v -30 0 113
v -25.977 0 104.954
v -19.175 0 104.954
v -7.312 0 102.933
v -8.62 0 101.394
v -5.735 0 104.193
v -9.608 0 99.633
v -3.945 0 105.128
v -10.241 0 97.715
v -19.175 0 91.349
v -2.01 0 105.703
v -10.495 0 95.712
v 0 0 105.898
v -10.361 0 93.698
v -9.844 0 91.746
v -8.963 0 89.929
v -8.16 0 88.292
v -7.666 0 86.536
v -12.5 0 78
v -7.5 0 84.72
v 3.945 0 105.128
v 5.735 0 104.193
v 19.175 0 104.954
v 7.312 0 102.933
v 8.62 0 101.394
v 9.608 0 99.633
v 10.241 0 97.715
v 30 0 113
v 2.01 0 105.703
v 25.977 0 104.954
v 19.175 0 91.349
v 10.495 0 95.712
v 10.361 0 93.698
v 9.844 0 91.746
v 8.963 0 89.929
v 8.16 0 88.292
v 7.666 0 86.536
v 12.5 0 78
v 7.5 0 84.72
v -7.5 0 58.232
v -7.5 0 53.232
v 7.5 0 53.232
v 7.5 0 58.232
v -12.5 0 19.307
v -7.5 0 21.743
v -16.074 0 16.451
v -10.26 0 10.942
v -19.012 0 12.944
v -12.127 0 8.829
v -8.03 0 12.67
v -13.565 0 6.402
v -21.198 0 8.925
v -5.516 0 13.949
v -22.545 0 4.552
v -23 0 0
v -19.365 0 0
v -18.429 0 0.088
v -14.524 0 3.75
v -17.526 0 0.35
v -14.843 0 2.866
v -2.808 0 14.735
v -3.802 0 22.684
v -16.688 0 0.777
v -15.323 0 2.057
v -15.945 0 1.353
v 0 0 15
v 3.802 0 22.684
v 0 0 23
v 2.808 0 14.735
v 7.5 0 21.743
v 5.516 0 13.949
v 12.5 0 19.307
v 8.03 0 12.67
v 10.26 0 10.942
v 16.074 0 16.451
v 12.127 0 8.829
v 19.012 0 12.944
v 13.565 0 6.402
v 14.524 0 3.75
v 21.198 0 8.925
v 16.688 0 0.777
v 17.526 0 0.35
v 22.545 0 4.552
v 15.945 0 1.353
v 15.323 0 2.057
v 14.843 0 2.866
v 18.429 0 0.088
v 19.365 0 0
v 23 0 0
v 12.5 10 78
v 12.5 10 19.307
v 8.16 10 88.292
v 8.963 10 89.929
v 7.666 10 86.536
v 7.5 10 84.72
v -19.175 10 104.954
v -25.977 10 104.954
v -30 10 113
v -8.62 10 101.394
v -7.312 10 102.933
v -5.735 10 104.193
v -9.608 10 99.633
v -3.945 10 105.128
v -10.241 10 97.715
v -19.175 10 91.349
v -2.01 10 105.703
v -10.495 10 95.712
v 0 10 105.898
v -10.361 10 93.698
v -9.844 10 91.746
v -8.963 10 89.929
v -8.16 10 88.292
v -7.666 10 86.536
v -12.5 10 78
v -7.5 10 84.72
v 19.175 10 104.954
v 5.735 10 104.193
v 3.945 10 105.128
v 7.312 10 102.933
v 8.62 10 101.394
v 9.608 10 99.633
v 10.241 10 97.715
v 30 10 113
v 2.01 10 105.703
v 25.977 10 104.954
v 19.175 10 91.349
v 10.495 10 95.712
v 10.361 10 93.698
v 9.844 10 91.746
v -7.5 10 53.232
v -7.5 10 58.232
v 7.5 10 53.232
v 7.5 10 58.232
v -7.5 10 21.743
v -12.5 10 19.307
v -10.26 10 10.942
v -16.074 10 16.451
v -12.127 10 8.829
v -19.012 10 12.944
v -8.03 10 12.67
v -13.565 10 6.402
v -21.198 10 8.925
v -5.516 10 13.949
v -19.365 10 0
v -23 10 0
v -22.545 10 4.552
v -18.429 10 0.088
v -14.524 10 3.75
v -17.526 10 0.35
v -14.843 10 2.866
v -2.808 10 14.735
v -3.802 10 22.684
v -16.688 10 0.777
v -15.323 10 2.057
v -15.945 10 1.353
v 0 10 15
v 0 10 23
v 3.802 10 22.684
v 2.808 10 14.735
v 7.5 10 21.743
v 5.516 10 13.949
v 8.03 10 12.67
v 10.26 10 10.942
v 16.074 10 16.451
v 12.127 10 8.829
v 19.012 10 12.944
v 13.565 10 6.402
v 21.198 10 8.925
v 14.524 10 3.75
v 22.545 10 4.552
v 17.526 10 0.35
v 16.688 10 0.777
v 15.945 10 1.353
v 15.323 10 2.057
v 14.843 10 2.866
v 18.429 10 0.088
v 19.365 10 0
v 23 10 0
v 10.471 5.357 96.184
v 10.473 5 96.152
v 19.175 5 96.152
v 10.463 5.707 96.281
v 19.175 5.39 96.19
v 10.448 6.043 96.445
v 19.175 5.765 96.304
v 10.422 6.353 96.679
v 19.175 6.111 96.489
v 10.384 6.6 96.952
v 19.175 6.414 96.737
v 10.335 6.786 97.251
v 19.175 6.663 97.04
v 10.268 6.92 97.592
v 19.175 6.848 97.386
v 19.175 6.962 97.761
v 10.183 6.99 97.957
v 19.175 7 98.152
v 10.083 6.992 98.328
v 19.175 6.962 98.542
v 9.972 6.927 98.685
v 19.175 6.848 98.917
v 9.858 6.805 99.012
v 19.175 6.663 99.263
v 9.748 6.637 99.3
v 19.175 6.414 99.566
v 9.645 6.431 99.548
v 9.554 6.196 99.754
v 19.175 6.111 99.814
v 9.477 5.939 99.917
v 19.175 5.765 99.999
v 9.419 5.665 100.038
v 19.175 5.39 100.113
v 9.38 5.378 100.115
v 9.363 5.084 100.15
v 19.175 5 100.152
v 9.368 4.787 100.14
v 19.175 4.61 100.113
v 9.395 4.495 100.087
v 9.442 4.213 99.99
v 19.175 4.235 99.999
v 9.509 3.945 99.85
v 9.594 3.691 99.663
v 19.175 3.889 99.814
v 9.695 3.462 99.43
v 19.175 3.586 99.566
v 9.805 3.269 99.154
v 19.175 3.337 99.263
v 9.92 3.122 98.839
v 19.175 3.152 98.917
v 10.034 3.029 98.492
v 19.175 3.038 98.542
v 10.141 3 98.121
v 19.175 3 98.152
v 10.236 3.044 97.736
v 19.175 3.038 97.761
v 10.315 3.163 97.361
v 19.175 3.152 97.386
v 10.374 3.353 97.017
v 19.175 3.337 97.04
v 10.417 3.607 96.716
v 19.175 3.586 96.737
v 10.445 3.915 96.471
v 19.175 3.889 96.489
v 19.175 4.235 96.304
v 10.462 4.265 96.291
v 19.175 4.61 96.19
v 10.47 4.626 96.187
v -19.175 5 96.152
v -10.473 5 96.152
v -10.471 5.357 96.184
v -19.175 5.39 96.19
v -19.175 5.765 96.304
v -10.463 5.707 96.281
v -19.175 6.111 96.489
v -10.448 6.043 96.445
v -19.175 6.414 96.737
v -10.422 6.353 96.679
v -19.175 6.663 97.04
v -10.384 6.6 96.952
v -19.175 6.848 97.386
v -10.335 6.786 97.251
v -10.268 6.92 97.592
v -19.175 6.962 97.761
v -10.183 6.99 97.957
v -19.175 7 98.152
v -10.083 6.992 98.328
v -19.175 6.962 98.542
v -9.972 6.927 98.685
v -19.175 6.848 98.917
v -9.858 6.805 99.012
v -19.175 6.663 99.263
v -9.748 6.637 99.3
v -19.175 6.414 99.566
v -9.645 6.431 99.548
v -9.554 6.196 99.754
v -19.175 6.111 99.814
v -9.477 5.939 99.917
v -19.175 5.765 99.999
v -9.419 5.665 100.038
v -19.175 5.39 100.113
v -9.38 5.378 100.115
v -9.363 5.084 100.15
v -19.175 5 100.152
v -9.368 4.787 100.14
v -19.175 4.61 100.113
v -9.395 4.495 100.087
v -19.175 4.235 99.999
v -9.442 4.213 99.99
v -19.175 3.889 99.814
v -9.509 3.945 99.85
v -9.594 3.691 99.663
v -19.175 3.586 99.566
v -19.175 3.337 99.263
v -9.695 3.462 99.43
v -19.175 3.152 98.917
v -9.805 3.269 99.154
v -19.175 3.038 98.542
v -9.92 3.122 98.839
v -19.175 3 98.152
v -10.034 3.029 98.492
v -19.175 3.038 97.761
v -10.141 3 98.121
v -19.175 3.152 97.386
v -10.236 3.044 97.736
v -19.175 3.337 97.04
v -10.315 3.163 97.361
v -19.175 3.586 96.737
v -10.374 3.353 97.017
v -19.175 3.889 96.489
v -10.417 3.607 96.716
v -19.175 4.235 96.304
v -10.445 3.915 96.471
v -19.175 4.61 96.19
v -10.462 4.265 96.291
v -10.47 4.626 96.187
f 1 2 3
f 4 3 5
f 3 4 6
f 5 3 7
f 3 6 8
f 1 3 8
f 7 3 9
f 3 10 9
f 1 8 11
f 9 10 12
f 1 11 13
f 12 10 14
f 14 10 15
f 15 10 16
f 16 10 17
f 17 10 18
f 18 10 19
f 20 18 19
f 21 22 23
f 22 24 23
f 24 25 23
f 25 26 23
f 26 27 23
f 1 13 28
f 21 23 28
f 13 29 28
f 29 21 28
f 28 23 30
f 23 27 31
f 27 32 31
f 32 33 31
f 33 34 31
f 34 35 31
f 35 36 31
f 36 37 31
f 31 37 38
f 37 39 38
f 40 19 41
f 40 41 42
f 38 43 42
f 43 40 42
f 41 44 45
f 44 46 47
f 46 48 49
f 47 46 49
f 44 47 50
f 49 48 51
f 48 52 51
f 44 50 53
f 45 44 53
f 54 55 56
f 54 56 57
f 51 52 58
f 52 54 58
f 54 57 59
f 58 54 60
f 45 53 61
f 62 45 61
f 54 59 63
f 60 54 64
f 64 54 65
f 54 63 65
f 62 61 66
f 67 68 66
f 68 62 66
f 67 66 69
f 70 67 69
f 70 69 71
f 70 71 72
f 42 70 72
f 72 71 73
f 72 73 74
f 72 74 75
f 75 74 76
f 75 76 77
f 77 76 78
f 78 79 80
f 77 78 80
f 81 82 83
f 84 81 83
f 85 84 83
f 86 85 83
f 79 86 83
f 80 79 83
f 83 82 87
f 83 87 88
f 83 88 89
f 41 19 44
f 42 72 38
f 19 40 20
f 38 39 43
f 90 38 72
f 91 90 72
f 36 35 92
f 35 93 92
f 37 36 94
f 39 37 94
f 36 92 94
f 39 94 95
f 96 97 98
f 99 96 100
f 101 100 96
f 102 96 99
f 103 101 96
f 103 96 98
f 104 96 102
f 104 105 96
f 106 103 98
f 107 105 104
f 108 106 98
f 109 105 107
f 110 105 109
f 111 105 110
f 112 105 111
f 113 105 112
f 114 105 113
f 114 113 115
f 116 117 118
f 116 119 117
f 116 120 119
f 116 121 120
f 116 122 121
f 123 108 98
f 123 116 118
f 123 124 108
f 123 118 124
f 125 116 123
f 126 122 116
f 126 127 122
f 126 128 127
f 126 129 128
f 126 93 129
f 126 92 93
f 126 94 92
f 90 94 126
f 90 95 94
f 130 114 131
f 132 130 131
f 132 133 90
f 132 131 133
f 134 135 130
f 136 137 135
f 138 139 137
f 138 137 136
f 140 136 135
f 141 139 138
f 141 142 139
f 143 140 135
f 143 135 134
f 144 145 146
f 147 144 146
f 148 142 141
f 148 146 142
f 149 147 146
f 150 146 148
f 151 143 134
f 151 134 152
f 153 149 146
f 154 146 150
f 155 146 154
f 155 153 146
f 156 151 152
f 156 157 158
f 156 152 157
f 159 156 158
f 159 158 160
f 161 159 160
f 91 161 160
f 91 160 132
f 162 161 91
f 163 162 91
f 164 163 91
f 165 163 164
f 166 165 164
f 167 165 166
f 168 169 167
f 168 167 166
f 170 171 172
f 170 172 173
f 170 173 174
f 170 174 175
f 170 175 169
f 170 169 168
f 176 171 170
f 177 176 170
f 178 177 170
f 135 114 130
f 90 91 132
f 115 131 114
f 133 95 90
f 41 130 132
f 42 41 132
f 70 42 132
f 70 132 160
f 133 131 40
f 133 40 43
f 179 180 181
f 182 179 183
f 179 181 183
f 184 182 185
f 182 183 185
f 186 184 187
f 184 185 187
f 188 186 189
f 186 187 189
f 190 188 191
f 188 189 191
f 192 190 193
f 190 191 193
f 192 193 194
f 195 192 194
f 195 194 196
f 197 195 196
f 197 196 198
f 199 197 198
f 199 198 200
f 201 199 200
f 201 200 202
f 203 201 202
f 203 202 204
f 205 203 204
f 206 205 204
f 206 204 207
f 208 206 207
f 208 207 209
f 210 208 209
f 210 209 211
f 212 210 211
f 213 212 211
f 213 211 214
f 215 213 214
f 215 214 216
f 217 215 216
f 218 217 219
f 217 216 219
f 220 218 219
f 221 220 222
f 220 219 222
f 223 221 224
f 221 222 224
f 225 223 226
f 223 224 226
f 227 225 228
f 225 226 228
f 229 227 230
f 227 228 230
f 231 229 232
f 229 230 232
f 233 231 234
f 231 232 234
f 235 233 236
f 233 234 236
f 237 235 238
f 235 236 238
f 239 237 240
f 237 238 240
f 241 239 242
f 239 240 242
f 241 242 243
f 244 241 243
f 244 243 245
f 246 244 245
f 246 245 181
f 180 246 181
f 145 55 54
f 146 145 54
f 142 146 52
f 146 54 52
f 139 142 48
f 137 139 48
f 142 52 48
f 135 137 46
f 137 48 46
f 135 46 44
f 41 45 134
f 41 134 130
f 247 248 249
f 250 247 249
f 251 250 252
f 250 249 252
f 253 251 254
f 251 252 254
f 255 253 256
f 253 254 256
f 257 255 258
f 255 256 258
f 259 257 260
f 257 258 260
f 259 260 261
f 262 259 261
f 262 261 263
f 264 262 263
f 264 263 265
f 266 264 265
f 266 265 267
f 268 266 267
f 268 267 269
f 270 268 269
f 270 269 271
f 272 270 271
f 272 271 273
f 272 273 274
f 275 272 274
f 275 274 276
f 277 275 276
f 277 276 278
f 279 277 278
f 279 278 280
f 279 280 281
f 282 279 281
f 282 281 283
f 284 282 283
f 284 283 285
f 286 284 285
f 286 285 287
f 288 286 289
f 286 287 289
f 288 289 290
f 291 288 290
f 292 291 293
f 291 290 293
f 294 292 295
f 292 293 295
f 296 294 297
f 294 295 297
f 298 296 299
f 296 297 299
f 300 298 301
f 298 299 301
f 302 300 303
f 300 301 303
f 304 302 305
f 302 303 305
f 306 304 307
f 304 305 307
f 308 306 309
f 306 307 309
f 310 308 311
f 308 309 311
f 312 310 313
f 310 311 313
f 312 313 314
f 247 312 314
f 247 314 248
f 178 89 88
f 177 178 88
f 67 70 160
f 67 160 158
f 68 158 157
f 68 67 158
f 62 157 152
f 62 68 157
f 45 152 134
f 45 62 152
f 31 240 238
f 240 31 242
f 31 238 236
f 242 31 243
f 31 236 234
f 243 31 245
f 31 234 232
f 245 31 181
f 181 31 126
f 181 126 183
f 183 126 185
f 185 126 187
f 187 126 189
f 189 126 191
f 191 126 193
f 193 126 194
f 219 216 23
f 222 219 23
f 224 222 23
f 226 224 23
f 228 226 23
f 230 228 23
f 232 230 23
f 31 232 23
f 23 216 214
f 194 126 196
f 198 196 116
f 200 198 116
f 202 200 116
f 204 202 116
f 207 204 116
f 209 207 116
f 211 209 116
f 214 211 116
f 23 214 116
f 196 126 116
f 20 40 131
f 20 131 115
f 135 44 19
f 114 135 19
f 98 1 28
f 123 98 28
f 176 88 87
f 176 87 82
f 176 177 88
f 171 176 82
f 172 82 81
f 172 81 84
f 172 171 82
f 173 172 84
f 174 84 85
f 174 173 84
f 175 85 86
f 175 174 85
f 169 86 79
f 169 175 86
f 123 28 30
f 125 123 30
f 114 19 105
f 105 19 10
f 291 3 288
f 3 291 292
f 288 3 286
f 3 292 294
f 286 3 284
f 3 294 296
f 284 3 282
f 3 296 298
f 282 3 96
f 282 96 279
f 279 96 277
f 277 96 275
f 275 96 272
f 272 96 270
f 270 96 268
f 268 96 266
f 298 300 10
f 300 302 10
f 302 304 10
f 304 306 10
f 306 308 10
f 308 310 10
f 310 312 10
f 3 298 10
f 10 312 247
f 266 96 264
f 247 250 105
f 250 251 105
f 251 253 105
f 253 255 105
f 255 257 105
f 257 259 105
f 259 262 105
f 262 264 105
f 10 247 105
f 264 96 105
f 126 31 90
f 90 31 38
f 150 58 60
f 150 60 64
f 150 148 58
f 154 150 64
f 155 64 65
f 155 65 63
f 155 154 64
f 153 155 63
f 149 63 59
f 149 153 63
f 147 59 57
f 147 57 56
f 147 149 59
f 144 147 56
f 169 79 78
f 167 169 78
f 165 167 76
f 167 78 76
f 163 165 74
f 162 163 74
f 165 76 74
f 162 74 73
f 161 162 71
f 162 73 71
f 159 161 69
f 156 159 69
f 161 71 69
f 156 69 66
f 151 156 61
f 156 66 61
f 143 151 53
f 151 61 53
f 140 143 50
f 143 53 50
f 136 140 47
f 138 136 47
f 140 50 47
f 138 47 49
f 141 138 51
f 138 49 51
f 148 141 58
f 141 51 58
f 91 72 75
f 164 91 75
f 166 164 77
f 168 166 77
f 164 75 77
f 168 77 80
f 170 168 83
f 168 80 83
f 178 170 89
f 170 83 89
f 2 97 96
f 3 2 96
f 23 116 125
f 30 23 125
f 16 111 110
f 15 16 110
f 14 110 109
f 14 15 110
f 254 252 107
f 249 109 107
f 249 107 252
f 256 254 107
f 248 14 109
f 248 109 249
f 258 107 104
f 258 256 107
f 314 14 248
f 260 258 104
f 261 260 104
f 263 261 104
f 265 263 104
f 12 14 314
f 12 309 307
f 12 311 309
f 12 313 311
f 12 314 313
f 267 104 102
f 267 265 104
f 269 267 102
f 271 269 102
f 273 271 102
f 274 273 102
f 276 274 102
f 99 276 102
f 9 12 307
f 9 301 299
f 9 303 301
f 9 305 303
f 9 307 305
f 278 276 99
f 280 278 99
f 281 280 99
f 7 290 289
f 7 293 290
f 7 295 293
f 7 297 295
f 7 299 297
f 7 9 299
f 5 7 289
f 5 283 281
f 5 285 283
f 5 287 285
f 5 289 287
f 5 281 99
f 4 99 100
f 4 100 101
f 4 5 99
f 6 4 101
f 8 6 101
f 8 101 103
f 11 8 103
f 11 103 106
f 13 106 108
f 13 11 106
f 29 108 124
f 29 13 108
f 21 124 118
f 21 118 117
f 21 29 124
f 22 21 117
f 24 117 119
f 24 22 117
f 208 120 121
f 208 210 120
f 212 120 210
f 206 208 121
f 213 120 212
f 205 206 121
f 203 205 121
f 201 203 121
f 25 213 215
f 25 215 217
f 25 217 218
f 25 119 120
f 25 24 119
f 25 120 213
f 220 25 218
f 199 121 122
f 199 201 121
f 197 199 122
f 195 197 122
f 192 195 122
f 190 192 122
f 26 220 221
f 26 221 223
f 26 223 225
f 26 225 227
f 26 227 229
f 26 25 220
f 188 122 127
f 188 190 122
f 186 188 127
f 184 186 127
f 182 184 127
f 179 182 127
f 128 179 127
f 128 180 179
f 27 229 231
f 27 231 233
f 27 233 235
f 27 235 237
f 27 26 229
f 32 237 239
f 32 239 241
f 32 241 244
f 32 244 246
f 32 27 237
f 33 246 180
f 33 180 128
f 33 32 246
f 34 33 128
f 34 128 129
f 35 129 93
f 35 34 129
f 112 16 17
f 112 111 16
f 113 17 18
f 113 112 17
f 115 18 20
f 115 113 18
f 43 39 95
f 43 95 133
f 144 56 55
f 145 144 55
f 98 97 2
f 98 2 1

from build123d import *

# Parameters (mm, degrees)
BOSS_EXTRUDE1_DEPTH = 10
FILLET1_R           = 10
FILLET2_R           = 5
CUT_EXTRUDE1_DEPTH  = 10
SKETCH7_R           = 2
CUT_EXTRUDE2_DEPTH  = 43
SKETCH8_W           = 15
SKETCH8_H           = 5
BOSS_EXTRUDE3_DEPTH = 10


with BuildPart() as part:
    # Sketch1 → Boss-Extrude1 (new body)
    with BuildSketch(Plane(origin=(0, 0, 0), x_dir=(1, 0, 0), z_dir=(0, 1, 0))):
        with BuildLine():
            Line((12.5, -23), (12.5, -19.306734576))
            ThreePointArc((12.5, -19.306734576), (20.205197351, -10.988630488), (23, 0))
            Line((23, 0), (15, 0))
            ThreePointArc((15, 0), (0, -15), (-15, 0))
            Line((-15, 0), (-23, 0))
            ThreePointArc((-23, 0), (-20.205197351, -10.988630488), (-12.5, -19.306734576))
            Line((-12.5, -19.306734576), (-12.5, -23))
            Line((-12.5, -23), (-12.5, -78))
            Line((-12.5, -78), (-30, -113))
            Line((-30, -113), (-12.5, -113))
            Line((-12.5, -113), (12.5, -113))
            Line((12.5, -113), (30, -113))
            Line((30, -113), (12.5, -78))
            Line((12.5, -78), (12.5, -23))
        make_face()
        with BuildLine():
            ThreePointArc((-7.5, -88.04908974), (0, -105.897558969), (7.5, -88.04908974))
            Line((7.5, -88.04908974), (7.5, -33.180945535))
            Line((7.5, -33.180945535), (7.5, -21.742814905))
            ThreePointArc((7.5, -21.742814905), (0, -23), (-7.5, -21.742814905))
            Line((-7.5, -21.742814905), (-7.5, -33.180945535))
            Line((-7.5, -33.180945535), (-7.5, -88.04908974))
        make_face(mode=Mode.SUBTRACT)
    extrude(amount=BOSS_EXTRUDE1_DEPTH)

    # Fillet1
    fillet1_edges = [part.edges().sort_by_distance(p)[0] for p in [
        (7.5, 5, 88.04908974),
        (-7.5, 5, 88.04908974),
    ]]
    fillet(fillet1_edges, radius=FILLET1_R)

    # Fillet2
    fillet2_edges = [part.edges().sort_by_distance(p)[0] for p in [
        (-15, 5, 0),
        (15, 5, 0),
    ]]
    fillet(fillet2_edges, radius=FILLET2_R)

    # Sketch6 → Cut-Extrude1 (cut)
    with BuildSketch(Plane(origin=(0, 10, 0), x_dir=(1, 0, 0), z_dir=(0, 1, 0))):
        Polygon((25.97702769, -104.95405538), (19.174519353, -91.349038706), (19.174519353, -104.95405538), align=None)
        Polygon((-19.174519353, -104.95405538), (-19.174519353, -91.349038706), (-25.97702769, -104.95405538), align=None)
    extrude(amount=-CUT_EXTRUDE1_DEPTH, mode=Mode.SUBTRACT)

    # Sketch7 → Cut-Extrude2 (cut)
    with BuildSketch(Plane(origin=(19.174519353, 0, 0), x_dir=(0, 0, -1), z_dir=(1, 0, 0))):
        with Locations((-98.151547043, 5)):
            Circle(SKETCH7_R)
    extrude(amount=-CUT_EXTRUDE2_DEPTH, mode=Mode.SUBTRACT)

    # Sketch8 → Boss-Extrude3 (add)
    with BuildSketch(Plane(origin=(0, 10, 0), x_dir=(1, 0, 0), z_dir=(0, 1, 0))):
        with Locations((0, -55.731647811)):
            Rectangle(SKETCH8_W, SKETCH8_H)
    extrude(amount=-BOSS_EXTRUDE3_DEPTH)


solid = part.part
